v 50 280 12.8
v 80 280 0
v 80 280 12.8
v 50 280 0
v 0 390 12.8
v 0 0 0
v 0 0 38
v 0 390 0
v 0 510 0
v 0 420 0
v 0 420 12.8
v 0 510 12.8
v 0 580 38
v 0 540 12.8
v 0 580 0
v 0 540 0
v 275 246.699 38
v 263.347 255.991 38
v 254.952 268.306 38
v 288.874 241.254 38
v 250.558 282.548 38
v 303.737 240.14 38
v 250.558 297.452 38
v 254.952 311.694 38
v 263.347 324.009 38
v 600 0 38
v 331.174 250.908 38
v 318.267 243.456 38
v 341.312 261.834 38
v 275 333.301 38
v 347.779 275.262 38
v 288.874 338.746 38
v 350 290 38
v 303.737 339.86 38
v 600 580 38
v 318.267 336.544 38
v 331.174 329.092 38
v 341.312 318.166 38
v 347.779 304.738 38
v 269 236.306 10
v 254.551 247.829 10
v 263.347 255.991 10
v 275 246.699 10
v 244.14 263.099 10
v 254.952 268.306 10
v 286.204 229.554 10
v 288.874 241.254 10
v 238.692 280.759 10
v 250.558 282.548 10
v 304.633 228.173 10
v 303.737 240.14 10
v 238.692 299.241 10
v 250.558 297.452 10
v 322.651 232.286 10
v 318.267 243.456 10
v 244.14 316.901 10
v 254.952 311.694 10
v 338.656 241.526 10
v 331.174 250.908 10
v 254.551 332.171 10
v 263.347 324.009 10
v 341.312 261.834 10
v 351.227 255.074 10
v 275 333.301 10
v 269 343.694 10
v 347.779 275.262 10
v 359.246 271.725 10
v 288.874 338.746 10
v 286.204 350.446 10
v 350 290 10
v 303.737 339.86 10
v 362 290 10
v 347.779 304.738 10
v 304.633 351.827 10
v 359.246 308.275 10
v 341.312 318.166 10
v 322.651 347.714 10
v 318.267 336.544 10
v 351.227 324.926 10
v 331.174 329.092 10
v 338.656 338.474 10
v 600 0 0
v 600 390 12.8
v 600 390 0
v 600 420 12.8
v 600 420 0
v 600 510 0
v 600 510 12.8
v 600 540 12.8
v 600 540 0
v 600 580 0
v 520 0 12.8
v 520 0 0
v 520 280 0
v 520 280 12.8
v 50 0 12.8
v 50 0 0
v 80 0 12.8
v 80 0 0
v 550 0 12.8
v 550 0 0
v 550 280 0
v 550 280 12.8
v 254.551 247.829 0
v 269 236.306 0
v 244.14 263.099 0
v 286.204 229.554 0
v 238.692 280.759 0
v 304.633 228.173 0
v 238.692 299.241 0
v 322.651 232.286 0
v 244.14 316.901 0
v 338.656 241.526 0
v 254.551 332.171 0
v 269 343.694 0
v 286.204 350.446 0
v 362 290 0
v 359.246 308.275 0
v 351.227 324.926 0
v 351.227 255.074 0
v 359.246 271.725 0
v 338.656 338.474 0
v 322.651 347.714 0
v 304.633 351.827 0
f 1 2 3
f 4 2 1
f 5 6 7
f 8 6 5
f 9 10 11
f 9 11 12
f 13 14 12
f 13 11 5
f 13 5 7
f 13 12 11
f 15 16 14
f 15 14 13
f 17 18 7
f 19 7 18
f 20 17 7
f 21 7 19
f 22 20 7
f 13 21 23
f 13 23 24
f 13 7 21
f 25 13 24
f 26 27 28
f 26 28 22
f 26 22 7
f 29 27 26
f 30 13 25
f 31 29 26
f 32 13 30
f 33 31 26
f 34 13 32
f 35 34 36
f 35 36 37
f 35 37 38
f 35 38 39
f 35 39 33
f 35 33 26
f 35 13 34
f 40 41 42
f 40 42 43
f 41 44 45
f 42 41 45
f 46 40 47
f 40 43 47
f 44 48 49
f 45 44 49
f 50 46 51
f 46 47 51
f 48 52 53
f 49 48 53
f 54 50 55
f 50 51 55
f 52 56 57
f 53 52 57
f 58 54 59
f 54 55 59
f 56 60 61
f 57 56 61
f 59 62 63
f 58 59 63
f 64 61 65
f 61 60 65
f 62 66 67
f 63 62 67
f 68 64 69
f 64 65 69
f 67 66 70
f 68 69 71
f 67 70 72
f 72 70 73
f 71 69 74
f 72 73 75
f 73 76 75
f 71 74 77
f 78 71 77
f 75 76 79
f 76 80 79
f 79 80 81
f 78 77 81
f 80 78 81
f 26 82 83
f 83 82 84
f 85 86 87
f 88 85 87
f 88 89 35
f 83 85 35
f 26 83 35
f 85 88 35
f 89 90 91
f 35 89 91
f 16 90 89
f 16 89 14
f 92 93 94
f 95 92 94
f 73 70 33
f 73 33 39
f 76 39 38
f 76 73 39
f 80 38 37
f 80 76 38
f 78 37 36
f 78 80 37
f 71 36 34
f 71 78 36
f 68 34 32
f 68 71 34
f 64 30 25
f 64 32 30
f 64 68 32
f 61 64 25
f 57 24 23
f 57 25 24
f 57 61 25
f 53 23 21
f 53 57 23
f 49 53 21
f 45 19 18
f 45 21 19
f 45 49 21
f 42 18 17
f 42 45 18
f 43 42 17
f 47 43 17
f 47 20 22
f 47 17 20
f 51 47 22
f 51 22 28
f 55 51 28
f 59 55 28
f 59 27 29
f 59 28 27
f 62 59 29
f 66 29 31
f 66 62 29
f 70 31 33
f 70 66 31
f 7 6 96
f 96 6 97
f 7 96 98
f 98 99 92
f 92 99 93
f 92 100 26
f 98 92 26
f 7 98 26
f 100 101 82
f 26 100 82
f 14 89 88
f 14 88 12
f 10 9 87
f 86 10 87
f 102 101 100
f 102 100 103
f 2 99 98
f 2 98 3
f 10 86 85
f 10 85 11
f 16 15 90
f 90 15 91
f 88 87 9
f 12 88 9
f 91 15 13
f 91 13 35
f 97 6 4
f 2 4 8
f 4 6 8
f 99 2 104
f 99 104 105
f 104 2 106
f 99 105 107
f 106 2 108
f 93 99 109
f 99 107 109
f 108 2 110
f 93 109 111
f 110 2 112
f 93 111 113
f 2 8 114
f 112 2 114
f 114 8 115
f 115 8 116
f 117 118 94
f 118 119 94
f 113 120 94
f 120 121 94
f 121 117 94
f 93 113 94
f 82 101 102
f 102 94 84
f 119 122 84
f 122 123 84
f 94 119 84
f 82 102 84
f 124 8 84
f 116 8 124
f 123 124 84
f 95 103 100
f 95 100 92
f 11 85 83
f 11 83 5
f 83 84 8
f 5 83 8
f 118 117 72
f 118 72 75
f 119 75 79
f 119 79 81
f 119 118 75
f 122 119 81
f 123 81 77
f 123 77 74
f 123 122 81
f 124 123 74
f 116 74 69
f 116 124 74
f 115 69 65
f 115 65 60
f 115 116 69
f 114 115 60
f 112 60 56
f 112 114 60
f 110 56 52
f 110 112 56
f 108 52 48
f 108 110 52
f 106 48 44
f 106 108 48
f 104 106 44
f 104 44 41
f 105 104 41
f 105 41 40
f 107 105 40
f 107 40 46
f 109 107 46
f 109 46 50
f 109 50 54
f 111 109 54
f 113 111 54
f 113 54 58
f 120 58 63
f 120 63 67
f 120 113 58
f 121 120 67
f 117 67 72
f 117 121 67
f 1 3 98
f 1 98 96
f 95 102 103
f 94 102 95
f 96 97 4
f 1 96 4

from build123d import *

# Parameters (mm, degrees)
ESQUISSE1_W                  = 600
ESQUISSE1_H                  = 580
BOSS_EXTRU_1_DEPTH           = 38
ENL_V_MAT_EXTRU_1_DEPTH      = 836.370576451
ENL_V_MAT_EXTRU_1_DEPTH_BACK = 836.370576451
ESQUISSE2_R                  = 50
ESQUISSE3_R                  = 62
ENL_V_MAT_EXTRU_3_DEPTH      = 10
ESQUISSE4_W                  = 600
ESQUISSE4_H                  = 30
ENL_V_MAT_EXTRU_4_DEPTH      = 12.8
ESQUISSE5_W                  = 30
ESQUISSE5_H                  = 280
ENL_V_MAT_EXTRU_5_DEPTH      = 12.8


with BuildPart() as part:
    # Esquisse1 → Boss.-Extru.1 (new body)
    with BuildSketch(Plane.XY):
        with Locations((300, 290)):
            Rectangle(ESQUISSE1_W, ESQUISSE1_H)
    extrude(amount=BOSS_EXTRU_1_DEPTH)

    # Esquisse2 → Enlèv. mat.-Extru.1 (cut, two sides: drawn at the far end of the back side and taken through both)
    with BuildSketch(Plane.XY.offset(38).offset(-ENL_V_MAT_EXTRU_1_DEPTH_BACK)):
        with Locations((300, 290)):
            Circle(ESQUISSE2_R)
    extrude(amount=ENL_V_MAT_EXTRU_1_DEPTH + ENL_V_MAT_EXTRU_1_DEPTH_BACK, mode=Mode.SUBTRACT)

    # Esquisse3 → Enlèv. mat.-Extru.3 (cut)
    with BuildSketch(Plane.XY):
        with Locations((300, 290)):
            Circle(ESQUISSE3_R)
    extrude(amount=ENL_V_MAT_EXTRU_3_DEPTH, mode=Mode.SUBTRACT)

    # Esquisse4 → Enlèv. mat.-Extru.4 (cut)
    with BuildSketch(Plane(origin=(0, 0, 0), x_dir=(-1, 0, 0), z_dir=(0, 0, -1))):
        with Locations((-300, 405)):
            Rectangle(ESQUISSE4_W, ESQUISSE4_H)
        with Locations((-300, 525)):
            Rectangle(ESQUISSE4_W, ESQUISSE4_H)
    extrude(amount=-ENL_V_MAT_EXTRU_4_DEPTH, mode=Mode.SUBTRACT)

    # Esquisse5 → Enlèv. mat.-Extru.5 (cut)
    with BuildSketch(Plane(origin=(0, 0, 0), x_dir=(-1, 0, 0), z_dir=(0, 0, -1))):
        with Locations((-65, 140)):
            Rectangle(ESQUISSE5_W, ESQUISSE5_H)
        with Locations((-535, 140)):
            Rectangle(ESQUISSE5_W, ESQUISSE5_H)
    extrude(amount=-ENL_V_MAT_EXTRU_5_DEPTH, mode=Mode.SUBTRACT)


solid = part.part
